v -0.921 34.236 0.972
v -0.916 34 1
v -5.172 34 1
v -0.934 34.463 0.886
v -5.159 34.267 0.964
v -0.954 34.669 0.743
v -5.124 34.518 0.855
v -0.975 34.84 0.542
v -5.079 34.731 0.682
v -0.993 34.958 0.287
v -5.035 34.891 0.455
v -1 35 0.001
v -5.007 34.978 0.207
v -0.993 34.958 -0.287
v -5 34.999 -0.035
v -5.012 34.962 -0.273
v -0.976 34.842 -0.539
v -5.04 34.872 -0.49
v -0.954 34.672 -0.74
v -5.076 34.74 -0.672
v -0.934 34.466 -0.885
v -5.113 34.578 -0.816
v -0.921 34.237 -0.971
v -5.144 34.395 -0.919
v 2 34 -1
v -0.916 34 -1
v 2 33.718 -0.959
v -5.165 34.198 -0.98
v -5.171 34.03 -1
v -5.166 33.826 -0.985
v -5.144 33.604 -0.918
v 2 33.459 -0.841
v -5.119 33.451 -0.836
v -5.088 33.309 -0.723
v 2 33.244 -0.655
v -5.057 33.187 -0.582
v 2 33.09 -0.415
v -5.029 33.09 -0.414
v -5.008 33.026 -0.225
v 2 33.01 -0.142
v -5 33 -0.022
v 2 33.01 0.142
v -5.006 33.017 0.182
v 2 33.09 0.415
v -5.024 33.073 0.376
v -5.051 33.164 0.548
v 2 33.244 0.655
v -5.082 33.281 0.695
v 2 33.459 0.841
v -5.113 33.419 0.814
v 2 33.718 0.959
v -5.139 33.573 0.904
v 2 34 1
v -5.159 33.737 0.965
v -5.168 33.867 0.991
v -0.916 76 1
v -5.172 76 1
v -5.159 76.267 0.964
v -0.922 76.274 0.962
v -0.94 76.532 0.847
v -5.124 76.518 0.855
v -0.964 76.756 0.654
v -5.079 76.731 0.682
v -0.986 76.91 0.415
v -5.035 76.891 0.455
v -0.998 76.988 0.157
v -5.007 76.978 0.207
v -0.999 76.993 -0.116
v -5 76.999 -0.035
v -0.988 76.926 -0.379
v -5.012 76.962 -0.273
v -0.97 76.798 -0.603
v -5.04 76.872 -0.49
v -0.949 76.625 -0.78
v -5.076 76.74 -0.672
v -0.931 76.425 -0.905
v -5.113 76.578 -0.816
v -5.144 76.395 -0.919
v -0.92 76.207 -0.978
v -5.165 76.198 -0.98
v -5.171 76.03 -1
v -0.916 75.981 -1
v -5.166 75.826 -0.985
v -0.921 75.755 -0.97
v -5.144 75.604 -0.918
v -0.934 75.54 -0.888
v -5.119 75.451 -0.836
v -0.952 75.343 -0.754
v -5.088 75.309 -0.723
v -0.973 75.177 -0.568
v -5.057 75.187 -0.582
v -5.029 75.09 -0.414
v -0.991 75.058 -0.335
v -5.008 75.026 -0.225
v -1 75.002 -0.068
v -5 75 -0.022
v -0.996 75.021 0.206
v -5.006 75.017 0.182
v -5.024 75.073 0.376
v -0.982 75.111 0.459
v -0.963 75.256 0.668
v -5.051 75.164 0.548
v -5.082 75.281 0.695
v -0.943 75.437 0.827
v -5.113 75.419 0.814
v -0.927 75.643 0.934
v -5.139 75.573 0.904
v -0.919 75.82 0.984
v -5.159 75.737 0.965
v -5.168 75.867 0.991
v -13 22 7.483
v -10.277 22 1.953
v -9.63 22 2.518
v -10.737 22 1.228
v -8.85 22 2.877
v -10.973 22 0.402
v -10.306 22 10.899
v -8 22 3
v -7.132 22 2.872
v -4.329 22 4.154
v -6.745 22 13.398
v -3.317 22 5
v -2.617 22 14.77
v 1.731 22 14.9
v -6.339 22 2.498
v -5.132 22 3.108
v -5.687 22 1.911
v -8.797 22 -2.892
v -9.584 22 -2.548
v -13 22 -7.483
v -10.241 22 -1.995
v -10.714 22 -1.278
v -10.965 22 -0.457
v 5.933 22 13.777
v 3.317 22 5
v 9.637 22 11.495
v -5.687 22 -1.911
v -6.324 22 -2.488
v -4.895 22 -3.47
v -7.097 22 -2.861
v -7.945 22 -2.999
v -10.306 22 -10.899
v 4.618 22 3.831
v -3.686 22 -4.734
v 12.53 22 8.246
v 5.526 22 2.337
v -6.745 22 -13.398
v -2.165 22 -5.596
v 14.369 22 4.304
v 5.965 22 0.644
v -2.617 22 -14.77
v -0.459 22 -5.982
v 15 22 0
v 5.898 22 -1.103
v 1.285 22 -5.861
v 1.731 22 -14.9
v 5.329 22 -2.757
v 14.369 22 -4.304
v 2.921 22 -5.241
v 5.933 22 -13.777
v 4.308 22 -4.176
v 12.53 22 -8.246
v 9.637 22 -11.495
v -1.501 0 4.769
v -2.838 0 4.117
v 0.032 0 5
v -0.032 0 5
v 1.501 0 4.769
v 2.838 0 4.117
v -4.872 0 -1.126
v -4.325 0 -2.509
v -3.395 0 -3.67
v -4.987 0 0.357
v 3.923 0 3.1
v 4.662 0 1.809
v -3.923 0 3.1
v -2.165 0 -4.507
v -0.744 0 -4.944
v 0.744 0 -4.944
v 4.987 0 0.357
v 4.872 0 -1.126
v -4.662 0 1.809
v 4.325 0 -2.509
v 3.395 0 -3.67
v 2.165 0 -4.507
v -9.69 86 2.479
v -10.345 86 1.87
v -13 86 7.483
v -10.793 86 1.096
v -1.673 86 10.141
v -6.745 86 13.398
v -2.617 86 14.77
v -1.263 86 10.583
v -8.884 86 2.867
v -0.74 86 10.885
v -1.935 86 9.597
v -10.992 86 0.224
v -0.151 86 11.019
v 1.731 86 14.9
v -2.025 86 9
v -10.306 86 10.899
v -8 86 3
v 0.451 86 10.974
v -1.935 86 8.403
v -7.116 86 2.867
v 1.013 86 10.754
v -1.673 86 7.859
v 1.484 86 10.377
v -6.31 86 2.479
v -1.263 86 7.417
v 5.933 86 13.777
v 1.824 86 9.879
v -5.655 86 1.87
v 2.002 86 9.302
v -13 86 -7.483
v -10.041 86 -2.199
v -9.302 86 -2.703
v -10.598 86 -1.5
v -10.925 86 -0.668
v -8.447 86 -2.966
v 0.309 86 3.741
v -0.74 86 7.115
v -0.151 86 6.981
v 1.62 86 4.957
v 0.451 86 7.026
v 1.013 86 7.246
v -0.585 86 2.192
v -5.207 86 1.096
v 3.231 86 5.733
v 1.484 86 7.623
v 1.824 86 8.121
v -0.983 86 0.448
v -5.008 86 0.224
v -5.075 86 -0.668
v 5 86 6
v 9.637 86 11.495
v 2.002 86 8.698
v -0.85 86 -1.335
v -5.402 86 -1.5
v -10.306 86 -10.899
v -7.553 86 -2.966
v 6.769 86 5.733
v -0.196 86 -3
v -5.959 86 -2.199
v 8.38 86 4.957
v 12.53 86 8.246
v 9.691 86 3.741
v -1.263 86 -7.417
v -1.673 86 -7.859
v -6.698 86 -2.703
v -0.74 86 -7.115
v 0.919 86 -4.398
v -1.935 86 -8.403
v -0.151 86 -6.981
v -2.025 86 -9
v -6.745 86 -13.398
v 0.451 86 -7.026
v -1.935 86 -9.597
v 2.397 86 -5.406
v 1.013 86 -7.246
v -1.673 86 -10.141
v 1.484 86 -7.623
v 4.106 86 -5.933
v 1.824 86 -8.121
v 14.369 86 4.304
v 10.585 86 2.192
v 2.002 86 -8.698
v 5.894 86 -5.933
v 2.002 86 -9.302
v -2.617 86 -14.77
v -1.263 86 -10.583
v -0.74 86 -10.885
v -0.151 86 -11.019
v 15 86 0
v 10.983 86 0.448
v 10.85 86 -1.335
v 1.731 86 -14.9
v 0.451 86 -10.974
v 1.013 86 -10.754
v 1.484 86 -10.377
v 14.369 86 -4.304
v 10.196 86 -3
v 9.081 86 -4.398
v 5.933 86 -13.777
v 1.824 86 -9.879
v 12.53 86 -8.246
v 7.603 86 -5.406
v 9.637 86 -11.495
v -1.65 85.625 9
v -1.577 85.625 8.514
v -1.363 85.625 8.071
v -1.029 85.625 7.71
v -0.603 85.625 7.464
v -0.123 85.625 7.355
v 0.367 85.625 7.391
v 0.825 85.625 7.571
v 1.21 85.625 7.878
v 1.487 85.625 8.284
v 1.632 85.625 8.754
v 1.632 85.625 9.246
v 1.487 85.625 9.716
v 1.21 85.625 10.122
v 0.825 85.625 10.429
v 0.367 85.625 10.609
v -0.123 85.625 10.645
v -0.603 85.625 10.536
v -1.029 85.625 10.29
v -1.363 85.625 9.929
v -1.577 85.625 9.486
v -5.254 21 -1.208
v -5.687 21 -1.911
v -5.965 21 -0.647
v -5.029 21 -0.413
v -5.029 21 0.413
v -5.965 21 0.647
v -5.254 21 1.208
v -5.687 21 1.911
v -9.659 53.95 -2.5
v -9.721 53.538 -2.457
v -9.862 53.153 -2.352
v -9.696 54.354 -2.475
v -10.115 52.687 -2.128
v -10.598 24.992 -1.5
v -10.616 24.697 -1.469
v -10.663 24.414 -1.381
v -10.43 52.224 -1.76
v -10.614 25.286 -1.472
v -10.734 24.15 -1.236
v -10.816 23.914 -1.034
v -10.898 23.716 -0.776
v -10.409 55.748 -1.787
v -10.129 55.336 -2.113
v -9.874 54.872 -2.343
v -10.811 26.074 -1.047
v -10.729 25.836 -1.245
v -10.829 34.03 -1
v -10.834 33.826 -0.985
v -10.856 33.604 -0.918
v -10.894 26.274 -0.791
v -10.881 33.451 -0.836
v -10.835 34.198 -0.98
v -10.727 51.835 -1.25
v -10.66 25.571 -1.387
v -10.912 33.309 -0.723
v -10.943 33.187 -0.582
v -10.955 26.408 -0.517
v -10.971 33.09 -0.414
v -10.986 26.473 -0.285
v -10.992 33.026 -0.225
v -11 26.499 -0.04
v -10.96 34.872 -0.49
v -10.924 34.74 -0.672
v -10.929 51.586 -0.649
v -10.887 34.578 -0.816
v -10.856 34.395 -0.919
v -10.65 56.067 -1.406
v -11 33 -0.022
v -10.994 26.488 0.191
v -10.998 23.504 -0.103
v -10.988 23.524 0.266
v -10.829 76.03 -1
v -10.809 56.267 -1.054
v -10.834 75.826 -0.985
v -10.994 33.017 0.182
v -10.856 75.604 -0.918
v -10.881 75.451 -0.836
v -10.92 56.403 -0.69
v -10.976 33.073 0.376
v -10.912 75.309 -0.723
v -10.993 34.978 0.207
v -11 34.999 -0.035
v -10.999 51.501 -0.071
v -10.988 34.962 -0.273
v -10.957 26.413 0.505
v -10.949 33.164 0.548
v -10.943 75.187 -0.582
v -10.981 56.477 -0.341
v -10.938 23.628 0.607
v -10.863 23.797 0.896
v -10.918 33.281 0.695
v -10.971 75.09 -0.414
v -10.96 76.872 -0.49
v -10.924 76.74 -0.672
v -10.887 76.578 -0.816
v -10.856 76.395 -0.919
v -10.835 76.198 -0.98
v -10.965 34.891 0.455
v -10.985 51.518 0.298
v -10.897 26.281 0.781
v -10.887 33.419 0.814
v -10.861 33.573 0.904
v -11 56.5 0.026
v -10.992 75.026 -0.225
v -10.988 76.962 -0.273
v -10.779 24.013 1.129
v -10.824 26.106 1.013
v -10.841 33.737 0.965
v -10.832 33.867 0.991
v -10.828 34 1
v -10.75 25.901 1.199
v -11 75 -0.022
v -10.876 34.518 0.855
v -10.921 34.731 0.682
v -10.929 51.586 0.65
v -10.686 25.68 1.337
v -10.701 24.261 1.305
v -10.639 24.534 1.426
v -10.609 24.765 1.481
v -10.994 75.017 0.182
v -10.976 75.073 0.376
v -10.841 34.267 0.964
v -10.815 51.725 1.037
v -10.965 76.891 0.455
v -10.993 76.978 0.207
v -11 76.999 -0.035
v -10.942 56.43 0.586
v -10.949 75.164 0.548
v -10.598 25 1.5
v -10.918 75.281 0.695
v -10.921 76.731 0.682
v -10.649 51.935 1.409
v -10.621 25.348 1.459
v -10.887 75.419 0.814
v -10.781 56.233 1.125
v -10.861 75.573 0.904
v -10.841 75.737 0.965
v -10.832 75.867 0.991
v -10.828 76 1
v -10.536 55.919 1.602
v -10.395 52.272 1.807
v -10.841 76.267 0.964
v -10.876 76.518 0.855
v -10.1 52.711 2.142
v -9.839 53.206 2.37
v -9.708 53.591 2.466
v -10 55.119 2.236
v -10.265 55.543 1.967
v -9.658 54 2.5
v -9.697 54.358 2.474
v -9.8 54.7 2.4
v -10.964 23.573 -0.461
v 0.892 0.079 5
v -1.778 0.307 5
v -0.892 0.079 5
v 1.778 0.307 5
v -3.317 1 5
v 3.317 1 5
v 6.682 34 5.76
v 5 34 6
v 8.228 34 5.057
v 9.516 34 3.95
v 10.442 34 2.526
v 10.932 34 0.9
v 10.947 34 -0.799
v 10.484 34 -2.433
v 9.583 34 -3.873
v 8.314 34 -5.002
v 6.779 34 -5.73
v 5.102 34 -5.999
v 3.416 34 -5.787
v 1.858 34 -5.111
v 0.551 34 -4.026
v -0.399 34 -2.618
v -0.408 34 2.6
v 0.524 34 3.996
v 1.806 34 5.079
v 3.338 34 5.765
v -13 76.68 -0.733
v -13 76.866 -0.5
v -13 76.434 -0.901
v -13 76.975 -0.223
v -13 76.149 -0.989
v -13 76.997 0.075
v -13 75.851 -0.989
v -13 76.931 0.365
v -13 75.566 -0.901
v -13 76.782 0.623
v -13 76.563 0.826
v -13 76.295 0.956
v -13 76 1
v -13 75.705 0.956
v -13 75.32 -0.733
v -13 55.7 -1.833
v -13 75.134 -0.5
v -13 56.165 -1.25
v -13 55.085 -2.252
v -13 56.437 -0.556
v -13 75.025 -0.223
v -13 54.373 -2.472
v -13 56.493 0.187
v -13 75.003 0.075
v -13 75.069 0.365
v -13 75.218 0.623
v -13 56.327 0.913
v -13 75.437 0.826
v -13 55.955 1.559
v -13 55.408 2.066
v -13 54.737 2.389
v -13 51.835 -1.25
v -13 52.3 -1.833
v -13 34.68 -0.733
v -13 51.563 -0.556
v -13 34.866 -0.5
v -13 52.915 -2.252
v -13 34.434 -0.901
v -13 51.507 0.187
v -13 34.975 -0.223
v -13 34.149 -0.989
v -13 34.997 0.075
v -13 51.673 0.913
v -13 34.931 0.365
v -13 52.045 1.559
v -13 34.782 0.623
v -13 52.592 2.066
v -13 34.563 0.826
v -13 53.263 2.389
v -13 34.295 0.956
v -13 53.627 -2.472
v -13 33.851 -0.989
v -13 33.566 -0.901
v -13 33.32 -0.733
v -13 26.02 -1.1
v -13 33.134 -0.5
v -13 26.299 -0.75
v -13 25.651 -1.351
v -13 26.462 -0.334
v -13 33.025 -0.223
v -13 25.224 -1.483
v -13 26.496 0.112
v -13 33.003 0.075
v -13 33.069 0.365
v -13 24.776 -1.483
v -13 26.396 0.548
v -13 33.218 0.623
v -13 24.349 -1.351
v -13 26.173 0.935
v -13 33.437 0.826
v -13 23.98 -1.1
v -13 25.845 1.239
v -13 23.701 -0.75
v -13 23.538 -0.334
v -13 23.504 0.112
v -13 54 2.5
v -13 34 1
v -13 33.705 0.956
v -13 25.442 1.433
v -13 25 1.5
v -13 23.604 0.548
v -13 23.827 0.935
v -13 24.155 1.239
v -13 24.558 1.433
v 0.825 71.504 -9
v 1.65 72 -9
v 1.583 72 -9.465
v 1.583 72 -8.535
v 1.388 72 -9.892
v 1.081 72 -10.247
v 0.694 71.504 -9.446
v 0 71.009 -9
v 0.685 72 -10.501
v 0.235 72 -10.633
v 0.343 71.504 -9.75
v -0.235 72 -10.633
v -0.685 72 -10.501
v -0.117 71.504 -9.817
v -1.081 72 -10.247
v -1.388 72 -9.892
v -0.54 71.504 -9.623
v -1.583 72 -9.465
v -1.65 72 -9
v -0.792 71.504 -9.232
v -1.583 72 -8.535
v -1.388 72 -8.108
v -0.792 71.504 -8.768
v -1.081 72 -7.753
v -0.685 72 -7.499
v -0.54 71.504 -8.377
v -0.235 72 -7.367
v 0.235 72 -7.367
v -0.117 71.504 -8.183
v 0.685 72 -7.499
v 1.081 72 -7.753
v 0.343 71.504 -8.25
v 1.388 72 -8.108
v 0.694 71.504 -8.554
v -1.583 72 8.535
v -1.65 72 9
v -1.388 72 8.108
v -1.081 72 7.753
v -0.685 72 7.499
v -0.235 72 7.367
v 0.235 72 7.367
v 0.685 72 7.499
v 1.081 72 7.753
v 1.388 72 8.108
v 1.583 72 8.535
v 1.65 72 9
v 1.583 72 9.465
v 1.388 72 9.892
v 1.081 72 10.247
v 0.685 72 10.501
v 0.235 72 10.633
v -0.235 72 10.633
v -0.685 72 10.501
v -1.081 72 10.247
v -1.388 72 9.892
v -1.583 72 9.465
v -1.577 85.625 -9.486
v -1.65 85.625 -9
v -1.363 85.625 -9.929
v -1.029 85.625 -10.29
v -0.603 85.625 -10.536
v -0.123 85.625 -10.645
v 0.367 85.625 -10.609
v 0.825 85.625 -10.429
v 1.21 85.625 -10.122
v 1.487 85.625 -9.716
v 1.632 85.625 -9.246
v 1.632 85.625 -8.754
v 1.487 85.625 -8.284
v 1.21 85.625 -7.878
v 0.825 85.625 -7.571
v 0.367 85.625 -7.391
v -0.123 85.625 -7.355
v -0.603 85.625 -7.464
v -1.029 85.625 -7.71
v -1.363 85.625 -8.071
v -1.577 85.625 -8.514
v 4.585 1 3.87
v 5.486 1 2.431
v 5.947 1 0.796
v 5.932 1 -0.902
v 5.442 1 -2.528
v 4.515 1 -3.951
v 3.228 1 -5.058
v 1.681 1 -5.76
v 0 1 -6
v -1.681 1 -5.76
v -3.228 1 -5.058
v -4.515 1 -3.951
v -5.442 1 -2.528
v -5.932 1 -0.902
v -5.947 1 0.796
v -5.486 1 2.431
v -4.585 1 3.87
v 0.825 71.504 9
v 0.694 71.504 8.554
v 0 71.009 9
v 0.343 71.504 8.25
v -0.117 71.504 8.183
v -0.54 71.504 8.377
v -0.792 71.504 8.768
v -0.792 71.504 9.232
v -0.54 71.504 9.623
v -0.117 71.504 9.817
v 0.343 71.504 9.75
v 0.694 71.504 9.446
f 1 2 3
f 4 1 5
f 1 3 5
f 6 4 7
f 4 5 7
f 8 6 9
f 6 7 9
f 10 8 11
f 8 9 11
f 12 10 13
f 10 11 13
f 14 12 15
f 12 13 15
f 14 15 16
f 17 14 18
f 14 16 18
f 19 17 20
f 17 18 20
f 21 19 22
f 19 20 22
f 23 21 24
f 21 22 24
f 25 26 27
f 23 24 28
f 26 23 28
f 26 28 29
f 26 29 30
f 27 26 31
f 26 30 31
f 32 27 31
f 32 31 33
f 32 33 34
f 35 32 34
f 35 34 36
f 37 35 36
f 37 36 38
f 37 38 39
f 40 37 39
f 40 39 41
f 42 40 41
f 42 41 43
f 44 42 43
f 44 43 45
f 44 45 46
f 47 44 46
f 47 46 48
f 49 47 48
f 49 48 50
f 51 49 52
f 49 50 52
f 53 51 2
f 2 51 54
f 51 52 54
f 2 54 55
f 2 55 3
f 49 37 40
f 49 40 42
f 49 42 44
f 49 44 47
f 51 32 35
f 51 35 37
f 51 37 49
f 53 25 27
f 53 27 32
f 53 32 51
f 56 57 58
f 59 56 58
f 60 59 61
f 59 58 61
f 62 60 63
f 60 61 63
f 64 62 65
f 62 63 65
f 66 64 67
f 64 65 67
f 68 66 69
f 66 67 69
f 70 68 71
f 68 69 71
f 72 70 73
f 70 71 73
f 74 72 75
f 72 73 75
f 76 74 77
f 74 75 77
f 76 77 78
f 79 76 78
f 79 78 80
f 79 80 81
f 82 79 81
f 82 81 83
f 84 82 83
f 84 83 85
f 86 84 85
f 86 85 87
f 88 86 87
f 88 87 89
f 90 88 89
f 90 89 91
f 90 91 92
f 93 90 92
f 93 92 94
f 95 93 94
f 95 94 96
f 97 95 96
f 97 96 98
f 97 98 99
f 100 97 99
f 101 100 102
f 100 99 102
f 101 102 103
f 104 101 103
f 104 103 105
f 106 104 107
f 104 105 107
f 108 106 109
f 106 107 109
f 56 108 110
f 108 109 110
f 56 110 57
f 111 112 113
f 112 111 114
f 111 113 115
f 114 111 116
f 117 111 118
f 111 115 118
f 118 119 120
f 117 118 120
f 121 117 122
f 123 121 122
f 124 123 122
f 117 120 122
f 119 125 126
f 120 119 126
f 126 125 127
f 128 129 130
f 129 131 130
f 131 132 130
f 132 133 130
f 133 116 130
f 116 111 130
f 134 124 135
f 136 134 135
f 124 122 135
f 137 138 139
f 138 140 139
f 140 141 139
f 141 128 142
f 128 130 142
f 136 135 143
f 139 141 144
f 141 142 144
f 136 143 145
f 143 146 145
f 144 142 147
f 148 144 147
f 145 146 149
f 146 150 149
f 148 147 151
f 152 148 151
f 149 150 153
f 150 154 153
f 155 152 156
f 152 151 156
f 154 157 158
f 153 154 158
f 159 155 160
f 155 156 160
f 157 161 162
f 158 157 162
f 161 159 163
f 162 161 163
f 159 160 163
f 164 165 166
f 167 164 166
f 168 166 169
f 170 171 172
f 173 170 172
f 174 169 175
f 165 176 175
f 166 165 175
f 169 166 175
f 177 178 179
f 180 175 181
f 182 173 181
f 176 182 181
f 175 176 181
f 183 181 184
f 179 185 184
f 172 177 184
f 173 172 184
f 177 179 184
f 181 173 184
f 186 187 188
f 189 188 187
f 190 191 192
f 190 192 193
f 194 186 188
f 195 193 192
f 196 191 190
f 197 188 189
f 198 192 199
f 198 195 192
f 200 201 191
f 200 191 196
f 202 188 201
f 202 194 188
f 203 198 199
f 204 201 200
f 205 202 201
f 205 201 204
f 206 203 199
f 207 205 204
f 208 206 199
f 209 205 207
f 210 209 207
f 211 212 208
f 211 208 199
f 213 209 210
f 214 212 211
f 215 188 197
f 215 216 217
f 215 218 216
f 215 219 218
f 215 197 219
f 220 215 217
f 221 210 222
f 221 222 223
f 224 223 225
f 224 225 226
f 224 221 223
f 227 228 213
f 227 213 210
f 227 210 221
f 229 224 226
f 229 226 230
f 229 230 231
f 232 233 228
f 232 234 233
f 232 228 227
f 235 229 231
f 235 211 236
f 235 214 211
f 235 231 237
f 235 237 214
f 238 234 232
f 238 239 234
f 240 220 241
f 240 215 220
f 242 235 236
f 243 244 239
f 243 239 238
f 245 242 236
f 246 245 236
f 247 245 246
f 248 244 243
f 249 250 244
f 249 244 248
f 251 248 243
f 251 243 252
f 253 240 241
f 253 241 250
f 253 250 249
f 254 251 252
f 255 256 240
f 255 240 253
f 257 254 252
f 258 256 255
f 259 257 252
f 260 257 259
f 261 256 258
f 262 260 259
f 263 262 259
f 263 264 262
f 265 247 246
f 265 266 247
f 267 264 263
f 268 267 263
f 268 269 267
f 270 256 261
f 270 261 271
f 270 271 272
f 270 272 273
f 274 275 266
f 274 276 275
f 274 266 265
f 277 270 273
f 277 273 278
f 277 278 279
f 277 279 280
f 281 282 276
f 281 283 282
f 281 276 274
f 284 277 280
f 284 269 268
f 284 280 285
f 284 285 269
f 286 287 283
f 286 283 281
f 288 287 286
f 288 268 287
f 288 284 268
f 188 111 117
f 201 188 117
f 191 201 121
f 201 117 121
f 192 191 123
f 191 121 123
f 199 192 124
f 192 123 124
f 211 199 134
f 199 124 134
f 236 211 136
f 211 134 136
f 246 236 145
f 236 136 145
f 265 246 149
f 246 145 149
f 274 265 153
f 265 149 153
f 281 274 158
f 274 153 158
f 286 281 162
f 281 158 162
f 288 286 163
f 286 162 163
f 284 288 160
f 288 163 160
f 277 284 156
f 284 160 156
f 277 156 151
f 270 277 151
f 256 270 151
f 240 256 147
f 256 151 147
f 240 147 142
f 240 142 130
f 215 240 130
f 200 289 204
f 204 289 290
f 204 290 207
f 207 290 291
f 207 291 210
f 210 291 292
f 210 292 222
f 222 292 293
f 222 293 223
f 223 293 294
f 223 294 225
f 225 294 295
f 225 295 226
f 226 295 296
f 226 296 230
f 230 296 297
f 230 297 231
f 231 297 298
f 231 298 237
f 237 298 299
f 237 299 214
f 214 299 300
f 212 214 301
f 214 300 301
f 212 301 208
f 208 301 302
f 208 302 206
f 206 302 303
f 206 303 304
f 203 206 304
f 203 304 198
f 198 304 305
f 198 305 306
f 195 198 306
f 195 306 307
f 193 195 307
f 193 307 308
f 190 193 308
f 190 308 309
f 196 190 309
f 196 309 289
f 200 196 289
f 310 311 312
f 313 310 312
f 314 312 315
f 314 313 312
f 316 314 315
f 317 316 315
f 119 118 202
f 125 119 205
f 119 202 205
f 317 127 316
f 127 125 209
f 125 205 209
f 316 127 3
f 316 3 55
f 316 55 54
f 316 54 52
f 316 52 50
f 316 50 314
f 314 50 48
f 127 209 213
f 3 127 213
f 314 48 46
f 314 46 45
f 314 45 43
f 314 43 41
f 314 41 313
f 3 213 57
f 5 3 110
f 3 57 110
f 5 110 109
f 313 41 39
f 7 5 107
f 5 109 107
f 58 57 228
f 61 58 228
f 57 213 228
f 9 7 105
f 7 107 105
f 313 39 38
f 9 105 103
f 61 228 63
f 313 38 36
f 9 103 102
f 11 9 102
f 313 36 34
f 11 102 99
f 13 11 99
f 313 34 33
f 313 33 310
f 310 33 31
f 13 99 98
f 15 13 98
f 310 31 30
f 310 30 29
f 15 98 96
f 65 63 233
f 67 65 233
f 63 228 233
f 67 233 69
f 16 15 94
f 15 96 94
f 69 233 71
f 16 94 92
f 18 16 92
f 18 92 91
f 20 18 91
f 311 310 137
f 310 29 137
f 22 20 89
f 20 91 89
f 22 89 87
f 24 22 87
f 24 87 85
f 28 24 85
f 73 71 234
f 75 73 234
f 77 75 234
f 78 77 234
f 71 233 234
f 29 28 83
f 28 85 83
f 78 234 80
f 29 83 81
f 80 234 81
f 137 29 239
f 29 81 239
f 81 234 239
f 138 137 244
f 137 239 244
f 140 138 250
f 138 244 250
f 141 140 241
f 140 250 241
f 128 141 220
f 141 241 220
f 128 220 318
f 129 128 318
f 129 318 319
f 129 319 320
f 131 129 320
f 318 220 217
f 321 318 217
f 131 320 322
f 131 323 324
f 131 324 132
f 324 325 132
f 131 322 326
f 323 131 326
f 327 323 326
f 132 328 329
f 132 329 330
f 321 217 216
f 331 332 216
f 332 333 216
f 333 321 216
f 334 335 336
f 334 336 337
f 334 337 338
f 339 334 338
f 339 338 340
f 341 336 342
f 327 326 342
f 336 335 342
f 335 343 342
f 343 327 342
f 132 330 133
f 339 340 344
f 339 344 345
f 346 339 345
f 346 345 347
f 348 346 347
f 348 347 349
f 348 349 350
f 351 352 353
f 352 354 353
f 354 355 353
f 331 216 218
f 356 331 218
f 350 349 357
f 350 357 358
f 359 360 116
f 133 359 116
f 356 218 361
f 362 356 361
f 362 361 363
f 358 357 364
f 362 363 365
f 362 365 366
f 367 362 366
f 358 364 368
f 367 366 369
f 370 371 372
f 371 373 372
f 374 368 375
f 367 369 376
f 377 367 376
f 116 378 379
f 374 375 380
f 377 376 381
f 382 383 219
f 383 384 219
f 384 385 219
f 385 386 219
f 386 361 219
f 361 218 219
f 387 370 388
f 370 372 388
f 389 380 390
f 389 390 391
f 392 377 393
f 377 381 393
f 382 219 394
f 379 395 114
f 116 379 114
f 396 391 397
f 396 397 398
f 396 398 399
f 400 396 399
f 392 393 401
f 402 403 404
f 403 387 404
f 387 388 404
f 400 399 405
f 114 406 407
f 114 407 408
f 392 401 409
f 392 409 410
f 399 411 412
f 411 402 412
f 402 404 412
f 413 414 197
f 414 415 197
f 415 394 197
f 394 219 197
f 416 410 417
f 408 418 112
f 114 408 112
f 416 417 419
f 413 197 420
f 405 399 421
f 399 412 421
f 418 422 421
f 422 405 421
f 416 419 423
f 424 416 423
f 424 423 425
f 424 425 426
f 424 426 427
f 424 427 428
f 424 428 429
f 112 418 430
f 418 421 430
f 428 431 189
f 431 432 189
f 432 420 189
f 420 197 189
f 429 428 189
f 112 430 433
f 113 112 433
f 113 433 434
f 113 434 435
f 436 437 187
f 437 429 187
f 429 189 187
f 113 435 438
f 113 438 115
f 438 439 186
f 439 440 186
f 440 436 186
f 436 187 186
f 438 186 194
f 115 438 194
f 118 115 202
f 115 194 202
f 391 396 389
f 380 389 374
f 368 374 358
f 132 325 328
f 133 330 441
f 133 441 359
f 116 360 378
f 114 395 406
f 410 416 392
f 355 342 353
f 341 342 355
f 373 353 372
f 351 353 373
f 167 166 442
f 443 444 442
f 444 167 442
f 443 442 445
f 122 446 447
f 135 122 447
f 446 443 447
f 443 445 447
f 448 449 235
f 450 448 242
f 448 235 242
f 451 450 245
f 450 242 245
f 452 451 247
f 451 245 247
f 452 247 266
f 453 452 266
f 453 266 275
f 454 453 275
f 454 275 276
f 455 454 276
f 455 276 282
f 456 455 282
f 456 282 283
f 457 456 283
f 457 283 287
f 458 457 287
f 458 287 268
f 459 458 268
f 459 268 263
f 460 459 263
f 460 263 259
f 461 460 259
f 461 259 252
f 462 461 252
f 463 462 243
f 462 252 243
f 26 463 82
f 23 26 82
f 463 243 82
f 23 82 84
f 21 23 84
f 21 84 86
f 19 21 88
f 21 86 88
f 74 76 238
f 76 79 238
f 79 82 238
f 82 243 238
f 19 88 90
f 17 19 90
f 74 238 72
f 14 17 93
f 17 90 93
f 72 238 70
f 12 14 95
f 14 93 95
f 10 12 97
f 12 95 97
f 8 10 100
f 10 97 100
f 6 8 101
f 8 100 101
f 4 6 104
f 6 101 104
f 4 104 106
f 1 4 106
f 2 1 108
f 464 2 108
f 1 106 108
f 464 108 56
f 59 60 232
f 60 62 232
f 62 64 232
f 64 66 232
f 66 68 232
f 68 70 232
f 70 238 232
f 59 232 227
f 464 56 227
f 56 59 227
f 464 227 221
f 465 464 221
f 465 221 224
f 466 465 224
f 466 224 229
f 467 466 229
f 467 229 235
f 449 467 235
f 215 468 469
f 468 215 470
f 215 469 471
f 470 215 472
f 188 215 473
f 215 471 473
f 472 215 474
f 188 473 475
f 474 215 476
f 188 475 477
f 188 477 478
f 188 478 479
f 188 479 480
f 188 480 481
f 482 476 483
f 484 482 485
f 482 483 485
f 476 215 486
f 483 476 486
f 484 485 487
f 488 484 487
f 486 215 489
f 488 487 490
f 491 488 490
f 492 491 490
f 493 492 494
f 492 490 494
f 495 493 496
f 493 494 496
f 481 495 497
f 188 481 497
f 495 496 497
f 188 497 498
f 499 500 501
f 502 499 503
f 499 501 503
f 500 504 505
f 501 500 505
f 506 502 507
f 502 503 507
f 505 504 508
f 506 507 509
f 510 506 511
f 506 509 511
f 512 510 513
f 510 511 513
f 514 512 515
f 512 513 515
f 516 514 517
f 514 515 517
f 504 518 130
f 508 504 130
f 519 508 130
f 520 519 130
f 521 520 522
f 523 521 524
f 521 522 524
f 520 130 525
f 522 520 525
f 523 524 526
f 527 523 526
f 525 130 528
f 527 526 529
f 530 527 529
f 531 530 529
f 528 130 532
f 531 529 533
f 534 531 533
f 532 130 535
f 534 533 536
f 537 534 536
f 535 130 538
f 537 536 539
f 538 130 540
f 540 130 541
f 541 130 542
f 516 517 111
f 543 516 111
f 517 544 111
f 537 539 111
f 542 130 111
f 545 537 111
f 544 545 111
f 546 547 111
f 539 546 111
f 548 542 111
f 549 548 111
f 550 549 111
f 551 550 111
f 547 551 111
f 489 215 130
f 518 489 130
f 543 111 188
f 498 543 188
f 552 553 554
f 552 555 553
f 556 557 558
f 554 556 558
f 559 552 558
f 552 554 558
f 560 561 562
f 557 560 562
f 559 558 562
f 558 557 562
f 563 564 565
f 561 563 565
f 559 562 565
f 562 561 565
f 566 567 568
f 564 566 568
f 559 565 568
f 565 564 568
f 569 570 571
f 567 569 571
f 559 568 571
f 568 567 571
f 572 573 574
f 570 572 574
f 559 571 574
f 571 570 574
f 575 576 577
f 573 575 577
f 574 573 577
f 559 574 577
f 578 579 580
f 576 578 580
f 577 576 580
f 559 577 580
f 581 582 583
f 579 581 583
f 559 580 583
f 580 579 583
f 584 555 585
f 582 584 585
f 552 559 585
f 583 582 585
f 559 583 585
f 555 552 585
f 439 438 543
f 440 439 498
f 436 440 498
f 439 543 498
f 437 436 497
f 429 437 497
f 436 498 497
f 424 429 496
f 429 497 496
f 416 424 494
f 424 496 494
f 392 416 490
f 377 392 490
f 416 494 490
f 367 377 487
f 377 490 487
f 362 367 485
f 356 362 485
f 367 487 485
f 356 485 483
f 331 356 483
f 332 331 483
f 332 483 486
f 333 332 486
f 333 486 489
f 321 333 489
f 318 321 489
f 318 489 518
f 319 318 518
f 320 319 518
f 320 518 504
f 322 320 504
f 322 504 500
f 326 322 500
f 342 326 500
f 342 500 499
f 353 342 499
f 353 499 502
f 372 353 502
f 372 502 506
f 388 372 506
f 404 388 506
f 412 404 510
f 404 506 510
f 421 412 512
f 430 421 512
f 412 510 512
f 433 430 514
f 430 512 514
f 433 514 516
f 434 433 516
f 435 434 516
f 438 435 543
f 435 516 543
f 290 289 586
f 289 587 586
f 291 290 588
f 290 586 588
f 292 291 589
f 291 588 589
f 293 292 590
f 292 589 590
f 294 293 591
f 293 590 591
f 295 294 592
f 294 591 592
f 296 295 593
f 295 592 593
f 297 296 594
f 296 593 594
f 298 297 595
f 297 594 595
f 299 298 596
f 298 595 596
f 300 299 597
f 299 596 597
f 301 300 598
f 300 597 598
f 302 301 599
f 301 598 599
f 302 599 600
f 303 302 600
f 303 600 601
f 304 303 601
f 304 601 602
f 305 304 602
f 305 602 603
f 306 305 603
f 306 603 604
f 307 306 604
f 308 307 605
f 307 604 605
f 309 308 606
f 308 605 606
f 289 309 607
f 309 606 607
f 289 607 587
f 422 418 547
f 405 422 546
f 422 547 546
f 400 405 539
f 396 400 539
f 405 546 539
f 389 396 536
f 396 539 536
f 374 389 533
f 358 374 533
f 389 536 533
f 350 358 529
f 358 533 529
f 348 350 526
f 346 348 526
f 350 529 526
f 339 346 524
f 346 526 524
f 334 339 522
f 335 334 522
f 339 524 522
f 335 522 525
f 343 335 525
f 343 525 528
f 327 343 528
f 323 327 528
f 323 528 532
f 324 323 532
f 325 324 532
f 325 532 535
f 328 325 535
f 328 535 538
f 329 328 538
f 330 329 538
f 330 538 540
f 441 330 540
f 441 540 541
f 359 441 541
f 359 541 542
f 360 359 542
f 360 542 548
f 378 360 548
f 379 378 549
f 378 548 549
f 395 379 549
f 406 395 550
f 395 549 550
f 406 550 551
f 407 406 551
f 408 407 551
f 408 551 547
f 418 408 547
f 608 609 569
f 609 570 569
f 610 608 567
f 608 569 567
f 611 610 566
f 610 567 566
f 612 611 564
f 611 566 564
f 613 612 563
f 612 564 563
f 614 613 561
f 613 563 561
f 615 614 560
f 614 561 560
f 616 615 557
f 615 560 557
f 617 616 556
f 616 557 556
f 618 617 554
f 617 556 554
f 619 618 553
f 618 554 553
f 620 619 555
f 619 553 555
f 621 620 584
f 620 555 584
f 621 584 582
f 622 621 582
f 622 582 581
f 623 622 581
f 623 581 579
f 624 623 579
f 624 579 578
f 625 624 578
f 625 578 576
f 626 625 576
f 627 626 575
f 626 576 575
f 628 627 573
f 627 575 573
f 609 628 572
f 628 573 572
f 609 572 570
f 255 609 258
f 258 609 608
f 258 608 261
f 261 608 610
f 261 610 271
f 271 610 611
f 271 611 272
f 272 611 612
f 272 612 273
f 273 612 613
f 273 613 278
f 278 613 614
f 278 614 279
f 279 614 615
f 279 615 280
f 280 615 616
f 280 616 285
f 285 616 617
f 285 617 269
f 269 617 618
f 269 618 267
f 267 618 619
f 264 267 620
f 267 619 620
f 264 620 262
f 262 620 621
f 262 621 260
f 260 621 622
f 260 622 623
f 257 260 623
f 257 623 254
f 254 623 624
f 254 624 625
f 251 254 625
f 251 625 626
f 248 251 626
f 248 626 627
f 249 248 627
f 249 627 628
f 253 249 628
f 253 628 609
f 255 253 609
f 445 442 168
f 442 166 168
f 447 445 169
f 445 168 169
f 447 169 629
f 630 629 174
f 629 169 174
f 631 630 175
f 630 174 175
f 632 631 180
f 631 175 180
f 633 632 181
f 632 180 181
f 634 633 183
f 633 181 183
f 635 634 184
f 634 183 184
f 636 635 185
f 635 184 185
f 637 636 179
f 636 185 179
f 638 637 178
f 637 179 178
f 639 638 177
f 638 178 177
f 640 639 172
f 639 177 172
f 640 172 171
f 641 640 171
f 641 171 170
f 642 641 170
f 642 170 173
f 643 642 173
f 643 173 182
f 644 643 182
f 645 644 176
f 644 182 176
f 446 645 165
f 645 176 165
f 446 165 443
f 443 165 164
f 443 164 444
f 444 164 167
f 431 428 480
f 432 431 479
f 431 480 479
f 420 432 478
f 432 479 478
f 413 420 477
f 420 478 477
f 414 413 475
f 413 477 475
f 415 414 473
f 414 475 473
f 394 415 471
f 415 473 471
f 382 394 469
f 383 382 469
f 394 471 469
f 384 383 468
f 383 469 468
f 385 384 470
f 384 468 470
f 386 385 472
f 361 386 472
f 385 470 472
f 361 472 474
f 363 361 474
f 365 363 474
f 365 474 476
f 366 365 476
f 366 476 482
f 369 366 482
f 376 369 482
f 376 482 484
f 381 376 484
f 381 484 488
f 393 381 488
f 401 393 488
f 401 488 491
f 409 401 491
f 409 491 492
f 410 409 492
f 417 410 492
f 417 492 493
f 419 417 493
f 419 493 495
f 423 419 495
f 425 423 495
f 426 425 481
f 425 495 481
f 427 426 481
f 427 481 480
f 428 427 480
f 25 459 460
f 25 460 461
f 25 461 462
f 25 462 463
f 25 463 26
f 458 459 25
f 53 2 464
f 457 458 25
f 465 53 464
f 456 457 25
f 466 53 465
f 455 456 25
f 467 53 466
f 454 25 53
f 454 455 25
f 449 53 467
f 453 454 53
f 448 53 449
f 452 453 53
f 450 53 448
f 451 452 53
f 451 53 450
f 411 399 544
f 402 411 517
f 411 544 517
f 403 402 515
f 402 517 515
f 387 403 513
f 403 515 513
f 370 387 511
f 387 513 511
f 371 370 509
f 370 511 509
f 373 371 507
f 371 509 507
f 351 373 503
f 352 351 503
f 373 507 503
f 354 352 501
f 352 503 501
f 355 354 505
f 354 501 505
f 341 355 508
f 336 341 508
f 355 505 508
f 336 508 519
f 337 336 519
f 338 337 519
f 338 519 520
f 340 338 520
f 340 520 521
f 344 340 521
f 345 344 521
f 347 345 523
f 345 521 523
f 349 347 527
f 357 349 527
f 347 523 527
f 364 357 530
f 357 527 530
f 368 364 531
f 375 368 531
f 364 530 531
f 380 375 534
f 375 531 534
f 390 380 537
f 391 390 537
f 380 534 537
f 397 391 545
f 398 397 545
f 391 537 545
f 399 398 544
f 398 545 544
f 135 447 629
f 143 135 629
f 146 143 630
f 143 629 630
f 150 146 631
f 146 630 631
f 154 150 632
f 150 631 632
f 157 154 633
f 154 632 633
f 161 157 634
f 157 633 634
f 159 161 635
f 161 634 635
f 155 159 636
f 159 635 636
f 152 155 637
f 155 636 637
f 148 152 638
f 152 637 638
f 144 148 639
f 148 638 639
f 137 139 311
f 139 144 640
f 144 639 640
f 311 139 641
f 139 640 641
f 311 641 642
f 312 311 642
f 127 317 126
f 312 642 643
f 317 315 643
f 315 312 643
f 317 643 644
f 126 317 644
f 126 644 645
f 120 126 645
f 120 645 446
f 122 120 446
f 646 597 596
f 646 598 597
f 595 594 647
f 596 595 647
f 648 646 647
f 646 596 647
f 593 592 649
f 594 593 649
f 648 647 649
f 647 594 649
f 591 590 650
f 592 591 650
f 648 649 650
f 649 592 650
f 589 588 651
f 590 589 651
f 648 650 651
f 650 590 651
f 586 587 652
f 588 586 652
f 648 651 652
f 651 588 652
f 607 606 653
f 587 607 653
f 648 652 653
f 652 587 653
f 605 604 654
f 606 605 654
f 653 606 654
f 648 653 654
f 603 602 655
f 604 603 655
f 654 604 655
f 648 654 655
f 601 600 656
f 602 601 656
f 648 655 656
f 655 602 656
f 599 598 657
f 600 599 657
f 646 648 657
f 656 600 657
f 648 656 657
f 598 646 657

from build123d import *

# Parameters (mm, degrees)
BOSS_EXTRUDE1_DEPTH         = 22
BOSS_EXTRUDE2_DEPTH         = 64
SKETCH3_R                   = 3
CUT_EXTRUDE1_DEPTH          = 65
SKETCH4_R                   = 6
CUT_EXTRUDE2_DEPTH          = 52
M4_TAPPED_HOLE1_D           = 3.3
M4_TAPPED_HOLE1_DEPTH       = 14
M4_TAPPED_HOLE1_CSINK_D     = 4.05
M4_TAPPED_HOLE1_CSINK_ANGLE = 90
M4_TAPPED_HOLE1_TIP         = 0.991420021
SKETCH7_R                   = 2.5
SKETCH7_R_2                 = 1.5
CUT_EXTRUDE3_DEPTH          = 5
SKETCH8_R                   = 1
CUT_EXTRUDE4_DEPTH          = 15
CHAMFER1_SIZE               = 1


with BuildPart() as part:
    # Sketch1 → Boss-Extrude1 (new body)
    with BuildSketch(Plane(origin=(0, 0, 0), x_dir=(1, 0, 0), z_dir=(0, 1, 0))):
        with BuildLine():
            Line((-3.31662479, -5), (3.31662479, -5))
            ThreePointArc((3.31662479, -5), (0, 6), (-3.31662479, -5))
        make_face()
    extrude(amount=BOSS_EXTRUDE1_DEPTH)

    # Sketch2 → Boss-Extrude2 (add)
    with BuildSketch(Plane(origin=(0, 22, 0), x_dir=(1, 0, 0), z_dir=(0, 1, 0))):
        with BuildLine():
            Line((-13, 7.483314774), (-13, -7.483314774))
            ThreePointArc((-13, -7.483314774), (15, 0), (-13, 7.483314774))
        make_face()
    extrude(amount=BOSS_EXTRUDE2_DEPTH)

    # Sketch3 → Cut-Extrude1 (cut)
    with BuildSketch(Plane(origin=(0, 86, 0), x_dir=(1, 0, 0), z_dir=(0, 1, 0))):
        with Locations(Location((-8, 0, 0), (0, 0, 270))):
            Circle(SKETCH3_R)
    extrude(amount=-CUT_EXTRUDE1_DEPTH, mode=Mode.SUBTRACT)

    # Sketch4 → Cut-Extrude2 (cut)
    with BuildSketch(Plane(origin=(0, 86, 0), x_dir=(1, 0, 0), z_dir=(0, 1, 0))):
        with Locations(Location((5, 0, 0), (0, 0, 270))):
            Circle(SKETCH4_R)
    extrude(amount=-CUT_EXTRUDE2_DEPTH, mode=Mode.SUBTRACT)

    # M4 Tapped Hole1
    with Locations(Plane(origin=(0, 86, 0), x_dir=(1, 0, 0), z_dir=(0, 1, 0))):
        with Locations((0, 9), (0, -9)):
            CounterSinkHole(M4_TAPPED_HOLE1_D / 2, M4_TAPPED_HOLE1_CSINK_D / 2, depth=M4_TAPPED_HOLE1_DEPTH, counter_sink_angle=M4_TAPPED_HOLE1_CSINK_ANGLE)
            with Locations((0, 0, -(M4_TAPPED_HOLE1_DEPTH + M4_TAPPED_HOLE1_TIP / 2))):  # 118° drill point
                Cone(0, M4_TAPPED_HOLE1_D / 2, M4_TAPPED_HOLE1_TIP, mode=Mode.SUBTRACT)

    # Sketch7 → Cut-Extrude3 (cut)
    with BuildSketch(Plane.ZY.offset(13)):
        with Locations((0, 54)):
            Circle(SKETCH7_R)
        with Locations((0, 25)):
            Circle(SKETCH7_R_2)
    extrude(amount=-CUT_EXTRUDE3_DEPTH, mode=Mode.SUBTRACT)

    # Sketch8 → Cut-Extrude4 (cut)
    with BuildSketch(Plane.ZY.offset(13)):
        with Locations((0, 76)):
            Circle(SKETCH8_R)
        with Locations((0, 34)):
            Circle(SKETCH8_R)
    extrude(amount=-CUT_EXTRUDE4_DEPTH, mode=Mode.SUBTRACT)

    # Chamfer1
    chamfer1_edges = [part.edges().sort_by_distance(p)[0] for p in [
        (0, 0, -6),
    ]]
    chamfer(chamfer1_edges, length=CHAMFER1_SIZE - 0.0001)  # a hair under: the kernel refuses the full size


solid = part.part
